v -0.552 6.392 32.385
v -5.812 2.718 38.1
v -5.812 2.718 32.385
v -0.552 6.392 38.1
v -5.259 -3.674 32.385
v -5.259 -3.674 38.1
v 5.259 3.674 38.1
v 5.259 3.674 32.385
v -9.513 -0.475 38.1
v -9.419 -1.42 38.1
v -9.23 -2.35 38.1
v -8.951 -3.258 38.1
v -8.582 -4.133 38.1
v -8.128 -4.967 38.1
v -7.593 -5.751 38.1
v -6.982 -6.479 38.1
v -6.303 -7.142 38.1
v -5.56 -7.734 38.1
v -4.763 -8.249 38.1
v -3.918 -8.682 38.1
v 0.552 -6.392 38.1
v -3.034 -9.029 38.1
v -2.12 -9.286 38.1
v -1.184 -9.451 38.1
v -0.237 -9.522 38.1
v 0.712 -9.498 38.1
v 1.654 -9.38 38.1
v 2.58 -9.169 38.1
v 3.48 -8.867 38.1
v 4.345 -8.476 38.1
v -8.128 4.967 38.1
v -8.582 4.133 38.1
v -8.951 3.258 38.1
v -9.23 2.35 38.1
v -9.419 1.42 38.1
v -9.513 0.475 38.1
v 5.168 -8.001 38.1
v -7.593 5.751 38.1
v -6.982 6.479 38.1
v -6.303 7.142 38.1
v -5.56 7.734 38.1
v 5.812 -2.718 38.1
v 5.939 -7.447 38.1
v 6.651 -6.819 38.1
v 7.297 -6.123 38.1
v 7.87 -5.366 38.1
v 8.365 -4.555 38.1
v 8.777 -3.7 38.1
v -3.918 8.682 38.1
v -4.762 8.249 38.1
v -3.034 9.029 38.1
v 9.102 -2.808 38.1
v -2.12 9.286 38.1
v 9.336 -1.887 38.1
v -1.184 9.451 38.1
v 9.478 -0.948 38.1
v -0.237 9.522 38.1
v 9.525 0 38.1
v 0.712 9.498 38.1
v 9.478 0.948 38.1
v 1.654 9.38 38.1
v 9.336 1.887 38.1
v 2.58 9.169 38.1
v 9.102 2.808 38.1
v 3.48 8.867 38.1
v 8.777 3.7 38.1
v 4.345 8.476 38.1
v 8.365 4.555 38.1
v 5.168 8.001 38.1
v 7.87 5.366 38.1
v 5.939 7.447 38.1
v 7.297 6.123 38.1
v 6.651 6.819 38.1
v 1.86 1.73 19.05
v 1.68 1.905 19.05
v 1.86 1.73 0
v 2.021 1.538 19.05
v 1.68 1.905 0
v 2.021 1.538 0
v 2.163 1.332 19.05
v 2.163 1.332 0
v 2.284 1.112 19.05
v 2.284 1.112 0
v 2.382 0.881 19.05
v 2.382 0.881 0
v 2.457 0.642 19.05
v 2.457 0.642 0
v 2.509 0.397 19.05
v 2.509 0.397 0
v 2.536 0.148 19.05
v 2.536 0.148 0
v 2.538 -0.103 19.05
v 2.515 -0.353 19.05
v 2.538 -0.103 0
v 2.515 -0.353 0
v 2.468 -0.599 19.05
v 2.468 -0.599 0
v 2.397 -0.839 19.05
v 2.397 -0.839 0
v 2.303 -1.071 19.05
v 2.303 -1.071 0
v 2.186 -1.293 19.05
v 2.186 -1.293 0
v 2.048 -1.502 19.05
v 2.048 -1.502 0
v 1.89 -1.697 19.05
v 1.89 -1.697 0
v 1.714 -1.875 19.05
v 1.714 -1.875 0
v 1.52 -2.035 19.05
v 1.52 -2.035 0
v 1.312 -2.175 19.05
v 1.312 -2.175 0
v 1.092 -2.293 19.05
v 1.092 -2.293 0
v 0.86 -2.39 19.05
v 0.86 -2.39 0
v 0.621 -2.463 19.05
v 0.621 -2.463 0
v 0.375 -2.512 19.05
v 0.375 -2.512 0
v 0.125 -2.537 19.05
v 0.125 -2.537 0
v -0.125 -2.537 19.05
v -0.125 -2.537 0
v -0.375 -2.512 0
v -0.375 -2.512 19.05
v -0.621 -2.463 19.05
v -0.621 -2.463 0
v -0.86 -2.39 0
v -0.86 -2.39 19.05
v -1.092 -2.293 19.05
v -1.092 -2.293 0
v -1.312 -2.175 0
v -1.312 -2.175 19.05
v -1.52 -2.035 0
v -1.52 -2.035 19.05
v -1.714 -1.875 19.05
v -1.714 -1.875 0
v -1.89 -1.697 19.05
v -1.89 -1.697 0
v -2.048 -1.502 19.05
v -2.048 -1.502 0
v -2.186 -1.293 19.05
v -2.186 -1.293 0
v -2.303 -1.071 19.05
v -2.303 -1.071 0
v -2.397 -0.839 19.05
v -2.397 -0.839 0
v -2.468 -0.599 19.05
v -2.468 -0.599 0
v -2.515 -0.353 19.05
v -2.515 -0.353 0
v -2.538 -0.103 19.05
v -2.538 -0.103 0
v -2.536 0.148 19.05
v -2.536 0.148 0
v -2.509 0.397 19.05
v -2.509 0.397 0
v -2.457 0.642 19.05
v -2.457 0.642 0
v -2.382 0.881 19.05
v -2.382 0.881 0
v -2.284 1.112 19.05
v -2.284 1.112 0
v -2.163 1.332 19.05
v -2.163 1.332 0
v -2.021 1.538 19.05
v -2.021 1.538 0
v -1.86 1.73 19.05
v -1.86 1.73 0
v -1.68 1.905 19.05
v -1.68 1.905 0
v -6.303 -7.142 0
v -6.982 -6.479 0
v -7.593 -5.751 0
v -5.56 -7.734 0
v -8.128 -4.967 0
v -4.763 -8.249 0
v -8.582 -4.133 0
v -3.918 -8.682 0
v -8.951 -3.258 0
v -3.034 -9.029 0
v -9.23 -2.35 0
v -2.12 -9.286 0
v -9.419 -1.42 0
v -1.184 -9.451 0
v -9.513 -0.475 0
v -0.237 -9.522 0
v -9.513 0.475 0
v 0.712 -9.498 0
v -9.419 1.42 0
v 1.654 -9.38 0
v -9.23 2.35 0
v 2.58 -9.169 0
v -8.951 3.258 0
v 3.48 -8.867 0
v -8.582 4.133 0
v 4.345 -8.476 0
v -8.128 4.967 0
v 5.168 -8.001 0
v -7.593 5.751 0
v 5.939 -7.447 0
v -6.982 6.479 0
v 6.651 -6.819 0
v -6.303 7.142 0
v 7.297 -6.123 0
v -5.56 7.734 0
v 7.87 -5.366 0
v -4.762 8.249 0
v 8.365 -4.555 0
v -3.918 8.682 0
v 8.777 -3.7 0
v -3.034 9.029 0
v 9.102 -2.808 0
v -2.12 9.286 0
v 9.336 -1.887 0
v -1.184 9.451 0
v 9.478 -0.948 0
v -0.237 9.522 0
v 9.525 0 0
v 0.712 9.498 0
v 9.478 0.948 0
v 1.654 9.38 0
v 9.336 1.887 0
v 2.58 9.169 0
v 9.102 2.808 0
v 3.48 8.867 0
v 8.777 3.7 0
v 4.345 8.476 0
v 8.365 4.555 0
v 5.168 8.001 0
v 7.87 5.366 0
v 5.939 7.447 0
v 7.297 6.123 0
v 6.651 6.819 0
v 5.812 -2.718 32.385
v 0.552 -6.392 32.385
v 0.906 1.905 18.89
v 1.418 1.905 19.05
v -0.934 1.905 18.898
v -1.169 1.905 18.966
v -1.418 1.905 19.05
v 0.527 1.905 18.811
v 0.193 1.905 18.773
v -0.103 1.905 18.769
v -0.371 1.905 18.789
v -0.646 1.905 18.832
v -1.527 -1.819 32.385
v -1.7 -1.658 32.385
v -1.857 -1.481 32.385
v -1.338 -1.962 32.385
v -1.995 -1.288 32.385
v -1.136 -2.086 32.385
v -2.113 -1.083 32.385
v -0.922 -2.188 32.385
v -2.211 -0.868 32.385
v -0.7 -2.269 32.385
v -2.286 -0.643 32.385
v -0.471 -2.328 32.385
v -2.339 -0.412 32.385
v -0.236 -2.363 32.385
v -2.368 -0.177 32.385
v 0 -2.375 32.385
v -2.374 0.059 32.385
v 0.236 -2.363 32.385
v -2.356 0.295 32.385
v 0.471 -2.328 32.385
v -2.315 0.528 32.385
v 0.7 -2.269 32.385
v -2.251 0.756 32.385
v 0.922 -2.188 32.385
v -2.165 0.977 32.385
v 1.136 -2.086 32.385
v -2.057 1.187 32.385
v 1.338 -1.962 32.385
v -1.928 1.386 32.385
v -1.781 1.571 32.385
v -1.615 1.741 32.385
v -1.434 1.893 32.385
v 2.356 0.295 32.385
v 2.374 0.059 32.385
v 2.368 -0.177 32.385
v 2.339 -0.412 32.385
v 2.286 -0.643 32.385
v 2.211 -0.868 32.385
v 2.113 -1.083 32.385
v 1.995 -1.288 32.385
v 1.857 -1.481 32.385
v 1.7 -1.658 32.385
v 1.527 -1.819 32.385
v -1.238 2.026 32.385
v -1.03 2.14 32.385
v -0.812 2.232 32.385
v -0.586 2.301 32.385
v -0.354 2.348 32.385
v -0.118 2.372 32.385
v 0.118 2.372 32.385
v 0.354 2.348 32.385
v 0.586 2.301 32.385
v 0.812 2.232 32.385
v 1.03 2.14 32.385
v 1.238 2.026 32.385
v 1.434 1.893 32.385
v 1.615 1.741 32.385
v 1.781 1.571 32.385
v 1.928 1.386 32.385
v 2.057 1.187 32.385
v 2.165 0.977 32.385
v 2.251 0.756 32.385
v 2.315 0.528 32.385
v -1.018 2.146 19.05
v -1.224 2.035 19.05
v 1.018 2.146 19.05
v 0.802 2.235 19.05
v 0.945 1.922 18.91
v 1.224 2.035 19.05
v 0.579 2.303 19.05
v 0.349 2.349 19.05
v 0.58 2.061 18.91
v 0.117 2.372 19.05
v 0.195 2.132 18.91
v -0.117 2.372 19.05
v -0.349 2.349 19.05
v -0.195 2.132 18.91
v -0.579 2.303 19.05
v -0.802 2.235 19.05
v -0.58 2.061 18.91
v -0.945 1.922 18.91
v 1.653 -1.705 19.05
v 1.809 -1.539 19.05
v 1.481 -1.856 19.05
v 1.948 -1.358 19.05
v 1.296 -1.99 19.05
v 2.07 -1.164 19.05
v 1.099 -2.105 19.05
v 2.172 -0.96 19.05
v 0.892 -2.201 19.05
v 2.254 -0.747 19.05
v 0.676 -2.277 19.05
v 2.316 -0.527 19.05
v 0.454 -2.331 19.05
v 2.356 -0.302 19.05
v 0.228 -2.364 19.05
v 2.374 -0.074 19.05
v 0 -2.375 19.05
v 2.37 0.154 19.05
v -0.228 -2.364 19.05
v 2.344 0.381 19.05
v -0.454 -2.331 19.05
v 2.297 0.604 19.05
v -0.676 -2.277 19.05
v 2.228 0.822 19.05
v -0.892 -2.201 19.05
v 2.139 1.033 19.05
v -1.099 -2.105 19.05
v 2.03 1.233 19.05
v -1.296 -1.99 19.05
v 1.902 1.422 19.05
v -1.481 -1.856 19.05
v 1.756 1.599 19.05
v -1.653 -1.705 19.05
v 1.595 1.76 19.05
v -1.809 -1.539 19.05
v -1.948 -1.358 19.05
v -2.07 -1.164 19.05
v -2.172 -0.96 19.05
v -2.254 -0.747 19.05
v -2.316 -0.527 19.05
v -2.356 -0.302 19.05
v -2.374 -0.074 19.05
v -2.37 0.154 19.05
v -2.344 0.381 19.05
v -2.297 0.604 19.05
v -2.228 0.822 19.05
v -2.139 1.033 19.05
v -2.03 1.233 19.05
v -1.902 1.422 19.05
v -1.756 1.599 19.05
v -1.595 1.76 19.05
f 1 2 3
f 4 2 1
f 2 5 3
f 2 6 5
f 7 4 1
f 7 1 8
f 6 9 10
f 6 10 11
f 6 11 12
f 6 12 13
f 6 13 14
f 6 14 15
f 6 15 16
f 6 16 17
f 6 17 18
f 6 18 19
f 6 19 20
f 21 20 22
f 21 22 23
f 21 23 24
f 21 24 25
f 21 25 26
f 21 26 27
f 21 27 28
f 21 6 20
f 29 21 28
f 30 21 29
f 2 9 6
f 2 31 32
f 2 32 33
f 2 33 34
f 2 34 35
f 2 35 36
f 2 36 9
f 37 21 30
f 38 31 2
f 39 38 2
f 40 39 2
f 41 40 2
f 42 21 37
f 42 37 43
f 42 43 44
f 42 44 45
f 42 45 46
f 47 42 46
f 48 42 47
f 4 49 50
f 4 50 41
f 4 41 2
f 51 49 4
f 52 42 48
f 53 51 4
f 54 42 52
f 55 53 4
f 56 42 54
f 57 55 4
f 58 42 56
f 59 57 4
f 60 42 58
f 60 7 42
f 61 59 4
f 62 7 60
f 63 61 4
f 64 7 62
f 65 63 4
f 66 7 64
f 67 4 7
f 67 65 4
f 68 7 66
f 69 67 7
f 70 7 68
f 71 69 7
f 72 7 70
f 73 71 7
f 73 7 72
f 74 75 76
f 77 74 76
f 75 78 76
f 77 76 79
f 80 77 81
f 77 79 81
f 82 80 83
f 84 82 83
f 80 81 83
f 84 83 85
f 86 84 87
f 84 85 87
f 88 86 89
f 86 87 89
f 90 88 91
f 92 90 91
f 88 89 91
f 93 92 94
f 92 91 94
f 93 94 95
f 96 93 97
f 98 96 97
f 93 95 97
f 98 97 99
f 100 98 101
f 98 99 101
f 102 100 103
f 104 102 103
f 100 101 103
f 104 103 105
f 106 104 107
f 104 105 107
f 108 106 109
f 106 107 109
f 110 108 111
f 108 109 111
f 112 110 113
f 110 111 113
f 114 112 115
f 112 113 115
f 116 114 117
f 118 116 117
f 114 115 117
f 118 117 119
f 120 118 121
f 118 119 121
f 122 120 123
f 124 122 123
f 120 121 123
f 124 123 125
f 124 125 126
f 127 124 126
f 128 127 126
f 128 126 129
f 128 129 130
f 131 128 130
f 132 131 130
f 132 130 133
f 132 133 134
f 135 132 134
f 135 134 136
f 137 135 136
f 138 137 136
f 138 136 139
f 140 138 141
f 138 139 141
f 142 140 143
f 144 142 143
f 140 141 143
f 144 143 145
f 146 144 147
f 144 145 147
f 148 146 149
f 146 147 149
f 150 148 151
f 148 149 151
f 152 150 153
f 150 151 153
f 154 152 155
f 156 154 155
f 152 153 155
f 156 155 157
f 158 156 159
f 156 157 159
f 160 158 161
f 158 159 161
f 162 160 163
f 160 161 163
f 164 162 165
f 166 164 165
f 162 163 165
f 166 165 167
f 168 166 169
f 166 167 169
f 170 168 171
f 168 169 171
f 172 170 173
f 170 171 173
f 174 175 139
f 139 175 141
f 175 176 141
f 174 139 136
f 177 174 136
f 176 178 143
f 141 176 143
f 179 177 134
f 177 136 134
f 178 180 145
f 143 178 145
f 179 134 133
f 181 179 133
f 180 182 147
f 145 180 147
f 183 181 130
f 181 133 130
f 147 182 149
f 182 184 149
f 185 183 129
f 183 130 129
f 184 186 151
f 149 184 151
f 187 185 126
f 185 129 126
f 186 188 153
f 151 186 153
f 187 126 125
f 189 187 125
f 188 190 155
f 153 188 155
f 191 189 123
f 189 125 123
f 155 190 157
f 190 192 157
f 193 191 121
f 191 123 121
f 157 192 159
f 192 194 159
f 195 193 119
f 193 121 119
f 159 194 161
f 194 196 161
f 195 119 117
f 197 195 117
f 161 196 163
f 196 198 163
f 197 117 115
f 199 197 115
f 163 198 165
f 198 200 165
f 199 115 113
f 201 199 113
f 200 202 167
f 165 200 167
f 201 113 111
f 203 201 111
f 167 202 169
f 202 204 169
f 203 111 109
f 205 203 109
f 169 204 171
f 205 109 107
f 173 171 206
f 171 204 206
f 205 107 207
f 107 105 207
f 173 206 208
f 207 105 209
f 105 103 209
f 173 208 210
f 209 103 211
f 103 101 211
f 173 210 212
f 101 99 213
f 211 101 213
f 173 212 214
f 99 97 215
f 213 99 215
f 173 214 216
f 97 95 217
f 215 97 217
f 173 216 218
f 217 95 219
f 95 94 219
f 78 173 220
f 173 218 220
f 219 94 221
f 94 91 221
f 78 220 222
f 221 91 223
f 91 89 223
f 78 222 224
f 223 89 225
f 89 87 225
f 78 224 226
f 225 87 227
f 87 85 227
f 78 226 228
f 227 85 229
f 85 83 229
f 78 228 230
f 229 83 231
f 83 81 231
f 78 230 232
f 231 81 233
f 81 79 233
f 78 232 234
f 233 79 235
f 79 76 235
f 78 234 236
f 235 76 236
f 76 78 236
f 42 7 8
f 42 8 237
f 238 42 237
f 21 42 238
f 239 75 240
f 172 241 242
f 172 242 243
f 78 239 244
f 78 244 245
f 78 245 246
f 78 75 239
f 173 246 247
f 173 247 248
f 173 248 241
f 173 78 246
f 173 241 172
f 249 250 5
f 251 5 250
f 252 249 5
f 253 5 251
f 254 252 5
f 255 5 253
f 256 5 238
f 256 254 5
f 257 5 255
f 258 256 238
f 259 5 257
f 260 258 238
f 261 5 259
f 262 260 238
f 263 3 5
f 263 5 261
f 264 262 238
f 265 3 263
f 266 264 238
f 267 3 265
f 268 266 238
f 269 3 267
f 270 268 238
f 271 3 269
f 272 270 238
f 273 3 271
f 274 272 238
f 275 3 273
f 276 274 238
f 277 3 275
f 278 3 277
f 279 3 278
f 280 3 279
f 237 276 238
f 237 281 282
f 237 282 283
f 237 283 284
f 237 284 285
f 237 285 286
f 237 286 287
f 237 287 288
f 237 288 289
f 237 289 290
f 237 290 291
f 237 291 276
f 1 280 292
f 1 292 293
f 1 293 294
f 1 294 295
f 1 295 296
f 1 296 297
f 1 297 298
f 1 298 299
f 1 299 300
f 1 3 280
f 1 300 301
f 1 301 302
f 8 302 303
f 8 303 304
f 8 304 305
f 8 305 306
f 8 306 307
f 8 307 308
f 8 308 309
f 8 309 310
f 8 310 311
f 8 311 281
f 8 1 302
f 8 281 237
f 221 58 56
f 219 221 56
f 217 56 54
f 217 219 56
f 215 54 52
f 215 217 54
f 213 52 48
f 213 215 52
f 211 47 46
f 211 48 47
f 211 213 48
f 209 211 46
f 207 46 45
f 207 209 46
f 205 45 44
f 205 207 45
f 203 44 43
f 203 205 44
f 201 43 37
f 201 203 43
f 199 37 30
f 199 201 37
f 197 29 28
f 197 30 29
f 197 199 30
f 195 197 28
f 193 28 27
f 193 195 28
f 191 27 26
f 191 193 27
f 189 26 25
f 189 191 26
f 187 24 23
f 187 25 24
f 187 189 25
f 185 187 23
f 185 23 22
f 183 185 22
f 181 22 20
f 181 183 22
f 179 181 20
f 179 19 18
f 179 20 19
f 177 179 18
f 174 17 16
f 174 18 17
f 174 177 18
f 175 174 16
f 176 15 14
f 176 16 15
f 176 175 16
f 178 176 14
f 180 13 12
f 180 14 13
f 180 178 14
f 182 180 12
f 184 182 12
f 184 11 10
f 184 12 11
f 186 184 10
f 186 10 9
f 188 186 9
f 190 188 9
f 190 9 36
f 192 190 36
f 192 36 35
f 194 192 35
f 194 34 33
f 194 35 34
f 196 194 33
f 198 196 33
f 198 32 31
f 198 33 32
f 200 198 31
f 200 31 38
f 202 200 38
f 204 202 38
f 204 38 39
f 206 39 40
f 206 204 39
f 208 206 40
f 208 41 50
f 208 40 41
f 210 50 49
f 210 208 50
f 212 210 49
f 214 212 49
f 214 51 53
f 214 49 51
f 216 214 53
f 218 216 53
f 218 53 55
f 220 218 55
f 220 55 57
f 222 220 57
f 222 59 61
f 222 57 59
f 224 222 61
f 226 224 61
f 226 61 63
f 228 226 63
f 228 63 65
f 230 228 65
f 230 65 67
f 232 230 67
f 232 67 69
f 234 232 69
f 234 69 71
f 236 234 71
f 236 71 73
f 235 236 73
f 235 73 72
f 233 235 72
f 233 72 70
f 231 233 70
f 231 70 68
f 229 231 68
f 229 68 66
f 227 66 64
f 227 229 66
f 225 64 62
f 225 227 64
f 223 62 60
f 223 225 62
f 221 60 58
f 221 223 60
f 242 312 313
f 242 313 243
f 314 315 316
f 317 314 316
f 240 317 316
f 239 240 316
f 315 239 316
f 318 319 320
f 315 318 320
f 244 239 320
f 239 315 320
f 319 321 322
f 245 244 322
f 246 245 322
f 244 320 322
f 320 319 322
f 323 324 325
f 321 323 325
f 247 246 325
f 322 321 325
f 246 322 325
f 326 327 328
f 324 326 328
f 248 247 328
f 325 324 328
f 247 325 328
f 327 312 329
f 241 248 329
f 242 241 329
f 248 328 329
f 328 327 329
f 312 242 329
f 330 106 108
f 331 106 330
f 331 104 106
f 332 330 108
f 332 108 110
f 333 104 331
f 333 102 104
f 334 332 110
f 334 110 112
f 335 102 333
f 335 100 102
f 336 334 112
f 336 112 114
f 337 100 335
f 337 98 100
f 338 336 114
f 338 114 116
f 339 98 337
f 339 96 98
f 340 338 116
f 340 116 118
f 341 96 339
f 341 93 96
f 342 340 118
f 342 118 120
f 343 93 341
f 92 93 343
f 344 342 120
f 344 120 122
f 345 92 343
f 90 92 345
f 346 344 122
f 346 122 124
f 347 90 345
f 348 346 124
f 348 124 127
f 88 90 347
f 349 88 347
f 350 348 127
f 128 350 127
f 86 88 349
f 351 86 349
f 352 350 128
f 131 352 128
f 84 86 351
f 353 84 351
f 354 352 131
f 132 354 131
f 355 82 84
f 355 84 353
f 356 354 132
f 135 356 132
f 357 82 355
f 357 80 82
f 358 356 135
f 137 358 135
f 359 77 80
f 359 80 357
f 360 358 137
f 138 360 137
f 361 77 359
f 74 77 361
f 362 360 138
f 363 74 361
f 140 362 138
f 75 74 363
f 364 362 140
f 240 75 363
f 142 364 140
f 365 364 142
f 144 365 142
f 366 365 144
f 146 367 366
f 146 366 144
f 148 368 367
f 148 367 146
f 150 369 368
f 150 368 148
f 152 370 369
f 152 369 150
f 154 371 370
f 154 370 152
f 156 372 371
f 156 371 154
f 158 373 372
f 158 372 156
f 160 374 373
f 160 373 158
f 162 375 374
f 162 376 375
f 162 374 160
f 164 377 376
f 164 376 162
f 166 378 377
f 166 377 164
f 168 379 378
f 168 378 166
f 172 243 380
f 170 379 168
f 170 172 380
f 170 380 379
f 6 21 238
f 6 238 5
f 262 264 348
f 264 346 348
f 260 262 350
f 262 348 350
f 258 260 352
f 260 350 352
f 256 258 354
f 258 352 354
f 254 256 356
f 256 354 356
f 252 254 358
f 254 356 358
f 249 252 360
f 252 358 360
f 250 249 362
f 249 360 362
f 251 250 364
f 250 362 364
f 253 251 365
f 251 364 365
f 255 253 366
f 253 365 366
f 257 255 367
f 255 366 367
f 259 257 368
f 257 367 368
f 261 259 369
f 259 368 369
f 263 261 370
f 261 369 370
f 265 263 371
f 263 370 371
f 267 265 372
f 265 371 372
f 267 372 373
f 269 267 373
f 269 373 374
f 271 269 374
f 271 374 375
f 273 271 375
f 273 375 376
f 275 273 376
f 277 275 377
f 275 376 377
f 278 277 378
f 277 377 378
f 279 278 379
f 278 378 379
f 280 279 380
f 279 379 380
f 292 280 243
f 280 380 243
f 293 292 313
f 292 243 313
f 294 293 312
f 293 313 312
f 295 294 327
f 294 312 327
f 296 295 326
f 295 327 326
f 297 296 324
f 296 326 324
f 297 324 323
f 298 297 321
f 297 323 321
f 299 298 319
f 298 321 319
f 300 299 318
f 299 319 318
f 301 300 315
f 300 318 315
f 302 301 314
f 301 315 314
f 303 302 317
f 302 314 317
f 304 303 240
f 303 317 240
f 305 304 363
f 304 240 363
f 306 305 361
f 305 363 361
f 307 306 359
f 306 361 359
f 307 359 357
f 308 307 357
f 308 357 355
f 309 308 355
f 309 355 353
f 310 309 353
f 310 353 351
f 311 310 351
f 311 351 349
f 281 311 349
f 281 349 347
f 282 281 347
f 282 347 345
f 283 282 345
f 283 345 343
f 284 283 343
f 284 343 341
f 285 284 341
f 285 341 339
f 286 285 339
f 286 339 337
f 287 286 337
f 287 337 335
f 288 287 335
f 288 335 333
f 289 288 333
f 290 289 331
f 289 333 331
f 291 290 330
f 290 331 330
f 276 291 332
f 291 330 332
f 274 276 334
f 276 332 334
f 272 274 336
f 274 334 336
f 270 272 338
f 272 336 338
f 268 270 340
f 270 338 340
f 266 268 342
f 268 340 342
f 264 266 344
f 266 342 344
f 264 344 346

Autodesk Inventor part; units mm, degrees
ref_plane "YZ Plane" through (0, 0, 0) normal (1, 0, 0) x (0, 1, 0)
ref_plane "XZ Plane" through (0, 0, 0) normal (0, 1, 0) x (-1, 0, 0)
ref_plane "XY Plane" through (0, 0, 0) normal (0, 0, 1) x (1, 0, 0)
sketch "Sketch3" plane through (0, 0, 0) normal (0, 0, 1) x (1, 0, 0)
  circle A0 centre (0, 0) radius 9.525
  dimension "d7" = 19.05
extrude "Extrusion3" add sketch "Sketch3" along normal blind 38.1
sketch "Sketch4" plane through (0, 0, 38.1) normal (0, 0, 1) x (1, 0, 0)
  line L0 (5.2594, 3.6744) -> (5.8118, -2.7176)
  line L1 (5.8118, -2.7176) -> (0.5524, -6.392)
  line L2 (0.5524, -6.392) -> (-5.2594, -3.6744)
  line L3 (-5.2594, -3.6744) -> (-5.8118, 2.7176)
  line L4 (-5.8118, 2.7176) -> (-0.5524, 6.392)
  line L5 (-0.5524, 6.392) -> (5.2594, 3.6744)
  point P0 (0, 0)
  point P1 (0, 0)
  dimension "d10" = 11.1125
extrude "Extrusion4" cut sketch "Sketch4" against normal blind 5.715
sketch "Sketch5" plane through (0, 0, 32.385) normal (0, 0, 1) x (1, 0, 0)
  circle A0 centre (0, 0) radius 2.3749
  dimension "d13" = 4.7498
hole "Hole1" at (0, 0, 32.385) direction (0, 0, -1) diameter 4.7498 depth 13.335 tip angle 118
sketch "Sketch6" plane through (0, 0, 0) normal (0, 0, -1) x (-1, 0, 0)
  point P0 (0, 0)
sketch "Sketch7" plane through (0, 0, 0) normal (0, 0, -1) x (-1, 0, 0)
  point P0 (0, 0)
sketch "Sketch8" plane through (0, 0, 0) normal (0, 0, -1) x (-1, 0, 0)
  arc A0 (-1.6801, 1.905) -> (1.6801, 1.905) centre (0, 0) ccw
  line L0 (-1.6801, 1.905) -> (1.6801, 1.905)
  dimension "d21" = 5.08
extrude "Extrusion5" cut sketch "Sketch8" against normal blind 19.05
properties part number "Vertical Sedder motor and rail coupler"
